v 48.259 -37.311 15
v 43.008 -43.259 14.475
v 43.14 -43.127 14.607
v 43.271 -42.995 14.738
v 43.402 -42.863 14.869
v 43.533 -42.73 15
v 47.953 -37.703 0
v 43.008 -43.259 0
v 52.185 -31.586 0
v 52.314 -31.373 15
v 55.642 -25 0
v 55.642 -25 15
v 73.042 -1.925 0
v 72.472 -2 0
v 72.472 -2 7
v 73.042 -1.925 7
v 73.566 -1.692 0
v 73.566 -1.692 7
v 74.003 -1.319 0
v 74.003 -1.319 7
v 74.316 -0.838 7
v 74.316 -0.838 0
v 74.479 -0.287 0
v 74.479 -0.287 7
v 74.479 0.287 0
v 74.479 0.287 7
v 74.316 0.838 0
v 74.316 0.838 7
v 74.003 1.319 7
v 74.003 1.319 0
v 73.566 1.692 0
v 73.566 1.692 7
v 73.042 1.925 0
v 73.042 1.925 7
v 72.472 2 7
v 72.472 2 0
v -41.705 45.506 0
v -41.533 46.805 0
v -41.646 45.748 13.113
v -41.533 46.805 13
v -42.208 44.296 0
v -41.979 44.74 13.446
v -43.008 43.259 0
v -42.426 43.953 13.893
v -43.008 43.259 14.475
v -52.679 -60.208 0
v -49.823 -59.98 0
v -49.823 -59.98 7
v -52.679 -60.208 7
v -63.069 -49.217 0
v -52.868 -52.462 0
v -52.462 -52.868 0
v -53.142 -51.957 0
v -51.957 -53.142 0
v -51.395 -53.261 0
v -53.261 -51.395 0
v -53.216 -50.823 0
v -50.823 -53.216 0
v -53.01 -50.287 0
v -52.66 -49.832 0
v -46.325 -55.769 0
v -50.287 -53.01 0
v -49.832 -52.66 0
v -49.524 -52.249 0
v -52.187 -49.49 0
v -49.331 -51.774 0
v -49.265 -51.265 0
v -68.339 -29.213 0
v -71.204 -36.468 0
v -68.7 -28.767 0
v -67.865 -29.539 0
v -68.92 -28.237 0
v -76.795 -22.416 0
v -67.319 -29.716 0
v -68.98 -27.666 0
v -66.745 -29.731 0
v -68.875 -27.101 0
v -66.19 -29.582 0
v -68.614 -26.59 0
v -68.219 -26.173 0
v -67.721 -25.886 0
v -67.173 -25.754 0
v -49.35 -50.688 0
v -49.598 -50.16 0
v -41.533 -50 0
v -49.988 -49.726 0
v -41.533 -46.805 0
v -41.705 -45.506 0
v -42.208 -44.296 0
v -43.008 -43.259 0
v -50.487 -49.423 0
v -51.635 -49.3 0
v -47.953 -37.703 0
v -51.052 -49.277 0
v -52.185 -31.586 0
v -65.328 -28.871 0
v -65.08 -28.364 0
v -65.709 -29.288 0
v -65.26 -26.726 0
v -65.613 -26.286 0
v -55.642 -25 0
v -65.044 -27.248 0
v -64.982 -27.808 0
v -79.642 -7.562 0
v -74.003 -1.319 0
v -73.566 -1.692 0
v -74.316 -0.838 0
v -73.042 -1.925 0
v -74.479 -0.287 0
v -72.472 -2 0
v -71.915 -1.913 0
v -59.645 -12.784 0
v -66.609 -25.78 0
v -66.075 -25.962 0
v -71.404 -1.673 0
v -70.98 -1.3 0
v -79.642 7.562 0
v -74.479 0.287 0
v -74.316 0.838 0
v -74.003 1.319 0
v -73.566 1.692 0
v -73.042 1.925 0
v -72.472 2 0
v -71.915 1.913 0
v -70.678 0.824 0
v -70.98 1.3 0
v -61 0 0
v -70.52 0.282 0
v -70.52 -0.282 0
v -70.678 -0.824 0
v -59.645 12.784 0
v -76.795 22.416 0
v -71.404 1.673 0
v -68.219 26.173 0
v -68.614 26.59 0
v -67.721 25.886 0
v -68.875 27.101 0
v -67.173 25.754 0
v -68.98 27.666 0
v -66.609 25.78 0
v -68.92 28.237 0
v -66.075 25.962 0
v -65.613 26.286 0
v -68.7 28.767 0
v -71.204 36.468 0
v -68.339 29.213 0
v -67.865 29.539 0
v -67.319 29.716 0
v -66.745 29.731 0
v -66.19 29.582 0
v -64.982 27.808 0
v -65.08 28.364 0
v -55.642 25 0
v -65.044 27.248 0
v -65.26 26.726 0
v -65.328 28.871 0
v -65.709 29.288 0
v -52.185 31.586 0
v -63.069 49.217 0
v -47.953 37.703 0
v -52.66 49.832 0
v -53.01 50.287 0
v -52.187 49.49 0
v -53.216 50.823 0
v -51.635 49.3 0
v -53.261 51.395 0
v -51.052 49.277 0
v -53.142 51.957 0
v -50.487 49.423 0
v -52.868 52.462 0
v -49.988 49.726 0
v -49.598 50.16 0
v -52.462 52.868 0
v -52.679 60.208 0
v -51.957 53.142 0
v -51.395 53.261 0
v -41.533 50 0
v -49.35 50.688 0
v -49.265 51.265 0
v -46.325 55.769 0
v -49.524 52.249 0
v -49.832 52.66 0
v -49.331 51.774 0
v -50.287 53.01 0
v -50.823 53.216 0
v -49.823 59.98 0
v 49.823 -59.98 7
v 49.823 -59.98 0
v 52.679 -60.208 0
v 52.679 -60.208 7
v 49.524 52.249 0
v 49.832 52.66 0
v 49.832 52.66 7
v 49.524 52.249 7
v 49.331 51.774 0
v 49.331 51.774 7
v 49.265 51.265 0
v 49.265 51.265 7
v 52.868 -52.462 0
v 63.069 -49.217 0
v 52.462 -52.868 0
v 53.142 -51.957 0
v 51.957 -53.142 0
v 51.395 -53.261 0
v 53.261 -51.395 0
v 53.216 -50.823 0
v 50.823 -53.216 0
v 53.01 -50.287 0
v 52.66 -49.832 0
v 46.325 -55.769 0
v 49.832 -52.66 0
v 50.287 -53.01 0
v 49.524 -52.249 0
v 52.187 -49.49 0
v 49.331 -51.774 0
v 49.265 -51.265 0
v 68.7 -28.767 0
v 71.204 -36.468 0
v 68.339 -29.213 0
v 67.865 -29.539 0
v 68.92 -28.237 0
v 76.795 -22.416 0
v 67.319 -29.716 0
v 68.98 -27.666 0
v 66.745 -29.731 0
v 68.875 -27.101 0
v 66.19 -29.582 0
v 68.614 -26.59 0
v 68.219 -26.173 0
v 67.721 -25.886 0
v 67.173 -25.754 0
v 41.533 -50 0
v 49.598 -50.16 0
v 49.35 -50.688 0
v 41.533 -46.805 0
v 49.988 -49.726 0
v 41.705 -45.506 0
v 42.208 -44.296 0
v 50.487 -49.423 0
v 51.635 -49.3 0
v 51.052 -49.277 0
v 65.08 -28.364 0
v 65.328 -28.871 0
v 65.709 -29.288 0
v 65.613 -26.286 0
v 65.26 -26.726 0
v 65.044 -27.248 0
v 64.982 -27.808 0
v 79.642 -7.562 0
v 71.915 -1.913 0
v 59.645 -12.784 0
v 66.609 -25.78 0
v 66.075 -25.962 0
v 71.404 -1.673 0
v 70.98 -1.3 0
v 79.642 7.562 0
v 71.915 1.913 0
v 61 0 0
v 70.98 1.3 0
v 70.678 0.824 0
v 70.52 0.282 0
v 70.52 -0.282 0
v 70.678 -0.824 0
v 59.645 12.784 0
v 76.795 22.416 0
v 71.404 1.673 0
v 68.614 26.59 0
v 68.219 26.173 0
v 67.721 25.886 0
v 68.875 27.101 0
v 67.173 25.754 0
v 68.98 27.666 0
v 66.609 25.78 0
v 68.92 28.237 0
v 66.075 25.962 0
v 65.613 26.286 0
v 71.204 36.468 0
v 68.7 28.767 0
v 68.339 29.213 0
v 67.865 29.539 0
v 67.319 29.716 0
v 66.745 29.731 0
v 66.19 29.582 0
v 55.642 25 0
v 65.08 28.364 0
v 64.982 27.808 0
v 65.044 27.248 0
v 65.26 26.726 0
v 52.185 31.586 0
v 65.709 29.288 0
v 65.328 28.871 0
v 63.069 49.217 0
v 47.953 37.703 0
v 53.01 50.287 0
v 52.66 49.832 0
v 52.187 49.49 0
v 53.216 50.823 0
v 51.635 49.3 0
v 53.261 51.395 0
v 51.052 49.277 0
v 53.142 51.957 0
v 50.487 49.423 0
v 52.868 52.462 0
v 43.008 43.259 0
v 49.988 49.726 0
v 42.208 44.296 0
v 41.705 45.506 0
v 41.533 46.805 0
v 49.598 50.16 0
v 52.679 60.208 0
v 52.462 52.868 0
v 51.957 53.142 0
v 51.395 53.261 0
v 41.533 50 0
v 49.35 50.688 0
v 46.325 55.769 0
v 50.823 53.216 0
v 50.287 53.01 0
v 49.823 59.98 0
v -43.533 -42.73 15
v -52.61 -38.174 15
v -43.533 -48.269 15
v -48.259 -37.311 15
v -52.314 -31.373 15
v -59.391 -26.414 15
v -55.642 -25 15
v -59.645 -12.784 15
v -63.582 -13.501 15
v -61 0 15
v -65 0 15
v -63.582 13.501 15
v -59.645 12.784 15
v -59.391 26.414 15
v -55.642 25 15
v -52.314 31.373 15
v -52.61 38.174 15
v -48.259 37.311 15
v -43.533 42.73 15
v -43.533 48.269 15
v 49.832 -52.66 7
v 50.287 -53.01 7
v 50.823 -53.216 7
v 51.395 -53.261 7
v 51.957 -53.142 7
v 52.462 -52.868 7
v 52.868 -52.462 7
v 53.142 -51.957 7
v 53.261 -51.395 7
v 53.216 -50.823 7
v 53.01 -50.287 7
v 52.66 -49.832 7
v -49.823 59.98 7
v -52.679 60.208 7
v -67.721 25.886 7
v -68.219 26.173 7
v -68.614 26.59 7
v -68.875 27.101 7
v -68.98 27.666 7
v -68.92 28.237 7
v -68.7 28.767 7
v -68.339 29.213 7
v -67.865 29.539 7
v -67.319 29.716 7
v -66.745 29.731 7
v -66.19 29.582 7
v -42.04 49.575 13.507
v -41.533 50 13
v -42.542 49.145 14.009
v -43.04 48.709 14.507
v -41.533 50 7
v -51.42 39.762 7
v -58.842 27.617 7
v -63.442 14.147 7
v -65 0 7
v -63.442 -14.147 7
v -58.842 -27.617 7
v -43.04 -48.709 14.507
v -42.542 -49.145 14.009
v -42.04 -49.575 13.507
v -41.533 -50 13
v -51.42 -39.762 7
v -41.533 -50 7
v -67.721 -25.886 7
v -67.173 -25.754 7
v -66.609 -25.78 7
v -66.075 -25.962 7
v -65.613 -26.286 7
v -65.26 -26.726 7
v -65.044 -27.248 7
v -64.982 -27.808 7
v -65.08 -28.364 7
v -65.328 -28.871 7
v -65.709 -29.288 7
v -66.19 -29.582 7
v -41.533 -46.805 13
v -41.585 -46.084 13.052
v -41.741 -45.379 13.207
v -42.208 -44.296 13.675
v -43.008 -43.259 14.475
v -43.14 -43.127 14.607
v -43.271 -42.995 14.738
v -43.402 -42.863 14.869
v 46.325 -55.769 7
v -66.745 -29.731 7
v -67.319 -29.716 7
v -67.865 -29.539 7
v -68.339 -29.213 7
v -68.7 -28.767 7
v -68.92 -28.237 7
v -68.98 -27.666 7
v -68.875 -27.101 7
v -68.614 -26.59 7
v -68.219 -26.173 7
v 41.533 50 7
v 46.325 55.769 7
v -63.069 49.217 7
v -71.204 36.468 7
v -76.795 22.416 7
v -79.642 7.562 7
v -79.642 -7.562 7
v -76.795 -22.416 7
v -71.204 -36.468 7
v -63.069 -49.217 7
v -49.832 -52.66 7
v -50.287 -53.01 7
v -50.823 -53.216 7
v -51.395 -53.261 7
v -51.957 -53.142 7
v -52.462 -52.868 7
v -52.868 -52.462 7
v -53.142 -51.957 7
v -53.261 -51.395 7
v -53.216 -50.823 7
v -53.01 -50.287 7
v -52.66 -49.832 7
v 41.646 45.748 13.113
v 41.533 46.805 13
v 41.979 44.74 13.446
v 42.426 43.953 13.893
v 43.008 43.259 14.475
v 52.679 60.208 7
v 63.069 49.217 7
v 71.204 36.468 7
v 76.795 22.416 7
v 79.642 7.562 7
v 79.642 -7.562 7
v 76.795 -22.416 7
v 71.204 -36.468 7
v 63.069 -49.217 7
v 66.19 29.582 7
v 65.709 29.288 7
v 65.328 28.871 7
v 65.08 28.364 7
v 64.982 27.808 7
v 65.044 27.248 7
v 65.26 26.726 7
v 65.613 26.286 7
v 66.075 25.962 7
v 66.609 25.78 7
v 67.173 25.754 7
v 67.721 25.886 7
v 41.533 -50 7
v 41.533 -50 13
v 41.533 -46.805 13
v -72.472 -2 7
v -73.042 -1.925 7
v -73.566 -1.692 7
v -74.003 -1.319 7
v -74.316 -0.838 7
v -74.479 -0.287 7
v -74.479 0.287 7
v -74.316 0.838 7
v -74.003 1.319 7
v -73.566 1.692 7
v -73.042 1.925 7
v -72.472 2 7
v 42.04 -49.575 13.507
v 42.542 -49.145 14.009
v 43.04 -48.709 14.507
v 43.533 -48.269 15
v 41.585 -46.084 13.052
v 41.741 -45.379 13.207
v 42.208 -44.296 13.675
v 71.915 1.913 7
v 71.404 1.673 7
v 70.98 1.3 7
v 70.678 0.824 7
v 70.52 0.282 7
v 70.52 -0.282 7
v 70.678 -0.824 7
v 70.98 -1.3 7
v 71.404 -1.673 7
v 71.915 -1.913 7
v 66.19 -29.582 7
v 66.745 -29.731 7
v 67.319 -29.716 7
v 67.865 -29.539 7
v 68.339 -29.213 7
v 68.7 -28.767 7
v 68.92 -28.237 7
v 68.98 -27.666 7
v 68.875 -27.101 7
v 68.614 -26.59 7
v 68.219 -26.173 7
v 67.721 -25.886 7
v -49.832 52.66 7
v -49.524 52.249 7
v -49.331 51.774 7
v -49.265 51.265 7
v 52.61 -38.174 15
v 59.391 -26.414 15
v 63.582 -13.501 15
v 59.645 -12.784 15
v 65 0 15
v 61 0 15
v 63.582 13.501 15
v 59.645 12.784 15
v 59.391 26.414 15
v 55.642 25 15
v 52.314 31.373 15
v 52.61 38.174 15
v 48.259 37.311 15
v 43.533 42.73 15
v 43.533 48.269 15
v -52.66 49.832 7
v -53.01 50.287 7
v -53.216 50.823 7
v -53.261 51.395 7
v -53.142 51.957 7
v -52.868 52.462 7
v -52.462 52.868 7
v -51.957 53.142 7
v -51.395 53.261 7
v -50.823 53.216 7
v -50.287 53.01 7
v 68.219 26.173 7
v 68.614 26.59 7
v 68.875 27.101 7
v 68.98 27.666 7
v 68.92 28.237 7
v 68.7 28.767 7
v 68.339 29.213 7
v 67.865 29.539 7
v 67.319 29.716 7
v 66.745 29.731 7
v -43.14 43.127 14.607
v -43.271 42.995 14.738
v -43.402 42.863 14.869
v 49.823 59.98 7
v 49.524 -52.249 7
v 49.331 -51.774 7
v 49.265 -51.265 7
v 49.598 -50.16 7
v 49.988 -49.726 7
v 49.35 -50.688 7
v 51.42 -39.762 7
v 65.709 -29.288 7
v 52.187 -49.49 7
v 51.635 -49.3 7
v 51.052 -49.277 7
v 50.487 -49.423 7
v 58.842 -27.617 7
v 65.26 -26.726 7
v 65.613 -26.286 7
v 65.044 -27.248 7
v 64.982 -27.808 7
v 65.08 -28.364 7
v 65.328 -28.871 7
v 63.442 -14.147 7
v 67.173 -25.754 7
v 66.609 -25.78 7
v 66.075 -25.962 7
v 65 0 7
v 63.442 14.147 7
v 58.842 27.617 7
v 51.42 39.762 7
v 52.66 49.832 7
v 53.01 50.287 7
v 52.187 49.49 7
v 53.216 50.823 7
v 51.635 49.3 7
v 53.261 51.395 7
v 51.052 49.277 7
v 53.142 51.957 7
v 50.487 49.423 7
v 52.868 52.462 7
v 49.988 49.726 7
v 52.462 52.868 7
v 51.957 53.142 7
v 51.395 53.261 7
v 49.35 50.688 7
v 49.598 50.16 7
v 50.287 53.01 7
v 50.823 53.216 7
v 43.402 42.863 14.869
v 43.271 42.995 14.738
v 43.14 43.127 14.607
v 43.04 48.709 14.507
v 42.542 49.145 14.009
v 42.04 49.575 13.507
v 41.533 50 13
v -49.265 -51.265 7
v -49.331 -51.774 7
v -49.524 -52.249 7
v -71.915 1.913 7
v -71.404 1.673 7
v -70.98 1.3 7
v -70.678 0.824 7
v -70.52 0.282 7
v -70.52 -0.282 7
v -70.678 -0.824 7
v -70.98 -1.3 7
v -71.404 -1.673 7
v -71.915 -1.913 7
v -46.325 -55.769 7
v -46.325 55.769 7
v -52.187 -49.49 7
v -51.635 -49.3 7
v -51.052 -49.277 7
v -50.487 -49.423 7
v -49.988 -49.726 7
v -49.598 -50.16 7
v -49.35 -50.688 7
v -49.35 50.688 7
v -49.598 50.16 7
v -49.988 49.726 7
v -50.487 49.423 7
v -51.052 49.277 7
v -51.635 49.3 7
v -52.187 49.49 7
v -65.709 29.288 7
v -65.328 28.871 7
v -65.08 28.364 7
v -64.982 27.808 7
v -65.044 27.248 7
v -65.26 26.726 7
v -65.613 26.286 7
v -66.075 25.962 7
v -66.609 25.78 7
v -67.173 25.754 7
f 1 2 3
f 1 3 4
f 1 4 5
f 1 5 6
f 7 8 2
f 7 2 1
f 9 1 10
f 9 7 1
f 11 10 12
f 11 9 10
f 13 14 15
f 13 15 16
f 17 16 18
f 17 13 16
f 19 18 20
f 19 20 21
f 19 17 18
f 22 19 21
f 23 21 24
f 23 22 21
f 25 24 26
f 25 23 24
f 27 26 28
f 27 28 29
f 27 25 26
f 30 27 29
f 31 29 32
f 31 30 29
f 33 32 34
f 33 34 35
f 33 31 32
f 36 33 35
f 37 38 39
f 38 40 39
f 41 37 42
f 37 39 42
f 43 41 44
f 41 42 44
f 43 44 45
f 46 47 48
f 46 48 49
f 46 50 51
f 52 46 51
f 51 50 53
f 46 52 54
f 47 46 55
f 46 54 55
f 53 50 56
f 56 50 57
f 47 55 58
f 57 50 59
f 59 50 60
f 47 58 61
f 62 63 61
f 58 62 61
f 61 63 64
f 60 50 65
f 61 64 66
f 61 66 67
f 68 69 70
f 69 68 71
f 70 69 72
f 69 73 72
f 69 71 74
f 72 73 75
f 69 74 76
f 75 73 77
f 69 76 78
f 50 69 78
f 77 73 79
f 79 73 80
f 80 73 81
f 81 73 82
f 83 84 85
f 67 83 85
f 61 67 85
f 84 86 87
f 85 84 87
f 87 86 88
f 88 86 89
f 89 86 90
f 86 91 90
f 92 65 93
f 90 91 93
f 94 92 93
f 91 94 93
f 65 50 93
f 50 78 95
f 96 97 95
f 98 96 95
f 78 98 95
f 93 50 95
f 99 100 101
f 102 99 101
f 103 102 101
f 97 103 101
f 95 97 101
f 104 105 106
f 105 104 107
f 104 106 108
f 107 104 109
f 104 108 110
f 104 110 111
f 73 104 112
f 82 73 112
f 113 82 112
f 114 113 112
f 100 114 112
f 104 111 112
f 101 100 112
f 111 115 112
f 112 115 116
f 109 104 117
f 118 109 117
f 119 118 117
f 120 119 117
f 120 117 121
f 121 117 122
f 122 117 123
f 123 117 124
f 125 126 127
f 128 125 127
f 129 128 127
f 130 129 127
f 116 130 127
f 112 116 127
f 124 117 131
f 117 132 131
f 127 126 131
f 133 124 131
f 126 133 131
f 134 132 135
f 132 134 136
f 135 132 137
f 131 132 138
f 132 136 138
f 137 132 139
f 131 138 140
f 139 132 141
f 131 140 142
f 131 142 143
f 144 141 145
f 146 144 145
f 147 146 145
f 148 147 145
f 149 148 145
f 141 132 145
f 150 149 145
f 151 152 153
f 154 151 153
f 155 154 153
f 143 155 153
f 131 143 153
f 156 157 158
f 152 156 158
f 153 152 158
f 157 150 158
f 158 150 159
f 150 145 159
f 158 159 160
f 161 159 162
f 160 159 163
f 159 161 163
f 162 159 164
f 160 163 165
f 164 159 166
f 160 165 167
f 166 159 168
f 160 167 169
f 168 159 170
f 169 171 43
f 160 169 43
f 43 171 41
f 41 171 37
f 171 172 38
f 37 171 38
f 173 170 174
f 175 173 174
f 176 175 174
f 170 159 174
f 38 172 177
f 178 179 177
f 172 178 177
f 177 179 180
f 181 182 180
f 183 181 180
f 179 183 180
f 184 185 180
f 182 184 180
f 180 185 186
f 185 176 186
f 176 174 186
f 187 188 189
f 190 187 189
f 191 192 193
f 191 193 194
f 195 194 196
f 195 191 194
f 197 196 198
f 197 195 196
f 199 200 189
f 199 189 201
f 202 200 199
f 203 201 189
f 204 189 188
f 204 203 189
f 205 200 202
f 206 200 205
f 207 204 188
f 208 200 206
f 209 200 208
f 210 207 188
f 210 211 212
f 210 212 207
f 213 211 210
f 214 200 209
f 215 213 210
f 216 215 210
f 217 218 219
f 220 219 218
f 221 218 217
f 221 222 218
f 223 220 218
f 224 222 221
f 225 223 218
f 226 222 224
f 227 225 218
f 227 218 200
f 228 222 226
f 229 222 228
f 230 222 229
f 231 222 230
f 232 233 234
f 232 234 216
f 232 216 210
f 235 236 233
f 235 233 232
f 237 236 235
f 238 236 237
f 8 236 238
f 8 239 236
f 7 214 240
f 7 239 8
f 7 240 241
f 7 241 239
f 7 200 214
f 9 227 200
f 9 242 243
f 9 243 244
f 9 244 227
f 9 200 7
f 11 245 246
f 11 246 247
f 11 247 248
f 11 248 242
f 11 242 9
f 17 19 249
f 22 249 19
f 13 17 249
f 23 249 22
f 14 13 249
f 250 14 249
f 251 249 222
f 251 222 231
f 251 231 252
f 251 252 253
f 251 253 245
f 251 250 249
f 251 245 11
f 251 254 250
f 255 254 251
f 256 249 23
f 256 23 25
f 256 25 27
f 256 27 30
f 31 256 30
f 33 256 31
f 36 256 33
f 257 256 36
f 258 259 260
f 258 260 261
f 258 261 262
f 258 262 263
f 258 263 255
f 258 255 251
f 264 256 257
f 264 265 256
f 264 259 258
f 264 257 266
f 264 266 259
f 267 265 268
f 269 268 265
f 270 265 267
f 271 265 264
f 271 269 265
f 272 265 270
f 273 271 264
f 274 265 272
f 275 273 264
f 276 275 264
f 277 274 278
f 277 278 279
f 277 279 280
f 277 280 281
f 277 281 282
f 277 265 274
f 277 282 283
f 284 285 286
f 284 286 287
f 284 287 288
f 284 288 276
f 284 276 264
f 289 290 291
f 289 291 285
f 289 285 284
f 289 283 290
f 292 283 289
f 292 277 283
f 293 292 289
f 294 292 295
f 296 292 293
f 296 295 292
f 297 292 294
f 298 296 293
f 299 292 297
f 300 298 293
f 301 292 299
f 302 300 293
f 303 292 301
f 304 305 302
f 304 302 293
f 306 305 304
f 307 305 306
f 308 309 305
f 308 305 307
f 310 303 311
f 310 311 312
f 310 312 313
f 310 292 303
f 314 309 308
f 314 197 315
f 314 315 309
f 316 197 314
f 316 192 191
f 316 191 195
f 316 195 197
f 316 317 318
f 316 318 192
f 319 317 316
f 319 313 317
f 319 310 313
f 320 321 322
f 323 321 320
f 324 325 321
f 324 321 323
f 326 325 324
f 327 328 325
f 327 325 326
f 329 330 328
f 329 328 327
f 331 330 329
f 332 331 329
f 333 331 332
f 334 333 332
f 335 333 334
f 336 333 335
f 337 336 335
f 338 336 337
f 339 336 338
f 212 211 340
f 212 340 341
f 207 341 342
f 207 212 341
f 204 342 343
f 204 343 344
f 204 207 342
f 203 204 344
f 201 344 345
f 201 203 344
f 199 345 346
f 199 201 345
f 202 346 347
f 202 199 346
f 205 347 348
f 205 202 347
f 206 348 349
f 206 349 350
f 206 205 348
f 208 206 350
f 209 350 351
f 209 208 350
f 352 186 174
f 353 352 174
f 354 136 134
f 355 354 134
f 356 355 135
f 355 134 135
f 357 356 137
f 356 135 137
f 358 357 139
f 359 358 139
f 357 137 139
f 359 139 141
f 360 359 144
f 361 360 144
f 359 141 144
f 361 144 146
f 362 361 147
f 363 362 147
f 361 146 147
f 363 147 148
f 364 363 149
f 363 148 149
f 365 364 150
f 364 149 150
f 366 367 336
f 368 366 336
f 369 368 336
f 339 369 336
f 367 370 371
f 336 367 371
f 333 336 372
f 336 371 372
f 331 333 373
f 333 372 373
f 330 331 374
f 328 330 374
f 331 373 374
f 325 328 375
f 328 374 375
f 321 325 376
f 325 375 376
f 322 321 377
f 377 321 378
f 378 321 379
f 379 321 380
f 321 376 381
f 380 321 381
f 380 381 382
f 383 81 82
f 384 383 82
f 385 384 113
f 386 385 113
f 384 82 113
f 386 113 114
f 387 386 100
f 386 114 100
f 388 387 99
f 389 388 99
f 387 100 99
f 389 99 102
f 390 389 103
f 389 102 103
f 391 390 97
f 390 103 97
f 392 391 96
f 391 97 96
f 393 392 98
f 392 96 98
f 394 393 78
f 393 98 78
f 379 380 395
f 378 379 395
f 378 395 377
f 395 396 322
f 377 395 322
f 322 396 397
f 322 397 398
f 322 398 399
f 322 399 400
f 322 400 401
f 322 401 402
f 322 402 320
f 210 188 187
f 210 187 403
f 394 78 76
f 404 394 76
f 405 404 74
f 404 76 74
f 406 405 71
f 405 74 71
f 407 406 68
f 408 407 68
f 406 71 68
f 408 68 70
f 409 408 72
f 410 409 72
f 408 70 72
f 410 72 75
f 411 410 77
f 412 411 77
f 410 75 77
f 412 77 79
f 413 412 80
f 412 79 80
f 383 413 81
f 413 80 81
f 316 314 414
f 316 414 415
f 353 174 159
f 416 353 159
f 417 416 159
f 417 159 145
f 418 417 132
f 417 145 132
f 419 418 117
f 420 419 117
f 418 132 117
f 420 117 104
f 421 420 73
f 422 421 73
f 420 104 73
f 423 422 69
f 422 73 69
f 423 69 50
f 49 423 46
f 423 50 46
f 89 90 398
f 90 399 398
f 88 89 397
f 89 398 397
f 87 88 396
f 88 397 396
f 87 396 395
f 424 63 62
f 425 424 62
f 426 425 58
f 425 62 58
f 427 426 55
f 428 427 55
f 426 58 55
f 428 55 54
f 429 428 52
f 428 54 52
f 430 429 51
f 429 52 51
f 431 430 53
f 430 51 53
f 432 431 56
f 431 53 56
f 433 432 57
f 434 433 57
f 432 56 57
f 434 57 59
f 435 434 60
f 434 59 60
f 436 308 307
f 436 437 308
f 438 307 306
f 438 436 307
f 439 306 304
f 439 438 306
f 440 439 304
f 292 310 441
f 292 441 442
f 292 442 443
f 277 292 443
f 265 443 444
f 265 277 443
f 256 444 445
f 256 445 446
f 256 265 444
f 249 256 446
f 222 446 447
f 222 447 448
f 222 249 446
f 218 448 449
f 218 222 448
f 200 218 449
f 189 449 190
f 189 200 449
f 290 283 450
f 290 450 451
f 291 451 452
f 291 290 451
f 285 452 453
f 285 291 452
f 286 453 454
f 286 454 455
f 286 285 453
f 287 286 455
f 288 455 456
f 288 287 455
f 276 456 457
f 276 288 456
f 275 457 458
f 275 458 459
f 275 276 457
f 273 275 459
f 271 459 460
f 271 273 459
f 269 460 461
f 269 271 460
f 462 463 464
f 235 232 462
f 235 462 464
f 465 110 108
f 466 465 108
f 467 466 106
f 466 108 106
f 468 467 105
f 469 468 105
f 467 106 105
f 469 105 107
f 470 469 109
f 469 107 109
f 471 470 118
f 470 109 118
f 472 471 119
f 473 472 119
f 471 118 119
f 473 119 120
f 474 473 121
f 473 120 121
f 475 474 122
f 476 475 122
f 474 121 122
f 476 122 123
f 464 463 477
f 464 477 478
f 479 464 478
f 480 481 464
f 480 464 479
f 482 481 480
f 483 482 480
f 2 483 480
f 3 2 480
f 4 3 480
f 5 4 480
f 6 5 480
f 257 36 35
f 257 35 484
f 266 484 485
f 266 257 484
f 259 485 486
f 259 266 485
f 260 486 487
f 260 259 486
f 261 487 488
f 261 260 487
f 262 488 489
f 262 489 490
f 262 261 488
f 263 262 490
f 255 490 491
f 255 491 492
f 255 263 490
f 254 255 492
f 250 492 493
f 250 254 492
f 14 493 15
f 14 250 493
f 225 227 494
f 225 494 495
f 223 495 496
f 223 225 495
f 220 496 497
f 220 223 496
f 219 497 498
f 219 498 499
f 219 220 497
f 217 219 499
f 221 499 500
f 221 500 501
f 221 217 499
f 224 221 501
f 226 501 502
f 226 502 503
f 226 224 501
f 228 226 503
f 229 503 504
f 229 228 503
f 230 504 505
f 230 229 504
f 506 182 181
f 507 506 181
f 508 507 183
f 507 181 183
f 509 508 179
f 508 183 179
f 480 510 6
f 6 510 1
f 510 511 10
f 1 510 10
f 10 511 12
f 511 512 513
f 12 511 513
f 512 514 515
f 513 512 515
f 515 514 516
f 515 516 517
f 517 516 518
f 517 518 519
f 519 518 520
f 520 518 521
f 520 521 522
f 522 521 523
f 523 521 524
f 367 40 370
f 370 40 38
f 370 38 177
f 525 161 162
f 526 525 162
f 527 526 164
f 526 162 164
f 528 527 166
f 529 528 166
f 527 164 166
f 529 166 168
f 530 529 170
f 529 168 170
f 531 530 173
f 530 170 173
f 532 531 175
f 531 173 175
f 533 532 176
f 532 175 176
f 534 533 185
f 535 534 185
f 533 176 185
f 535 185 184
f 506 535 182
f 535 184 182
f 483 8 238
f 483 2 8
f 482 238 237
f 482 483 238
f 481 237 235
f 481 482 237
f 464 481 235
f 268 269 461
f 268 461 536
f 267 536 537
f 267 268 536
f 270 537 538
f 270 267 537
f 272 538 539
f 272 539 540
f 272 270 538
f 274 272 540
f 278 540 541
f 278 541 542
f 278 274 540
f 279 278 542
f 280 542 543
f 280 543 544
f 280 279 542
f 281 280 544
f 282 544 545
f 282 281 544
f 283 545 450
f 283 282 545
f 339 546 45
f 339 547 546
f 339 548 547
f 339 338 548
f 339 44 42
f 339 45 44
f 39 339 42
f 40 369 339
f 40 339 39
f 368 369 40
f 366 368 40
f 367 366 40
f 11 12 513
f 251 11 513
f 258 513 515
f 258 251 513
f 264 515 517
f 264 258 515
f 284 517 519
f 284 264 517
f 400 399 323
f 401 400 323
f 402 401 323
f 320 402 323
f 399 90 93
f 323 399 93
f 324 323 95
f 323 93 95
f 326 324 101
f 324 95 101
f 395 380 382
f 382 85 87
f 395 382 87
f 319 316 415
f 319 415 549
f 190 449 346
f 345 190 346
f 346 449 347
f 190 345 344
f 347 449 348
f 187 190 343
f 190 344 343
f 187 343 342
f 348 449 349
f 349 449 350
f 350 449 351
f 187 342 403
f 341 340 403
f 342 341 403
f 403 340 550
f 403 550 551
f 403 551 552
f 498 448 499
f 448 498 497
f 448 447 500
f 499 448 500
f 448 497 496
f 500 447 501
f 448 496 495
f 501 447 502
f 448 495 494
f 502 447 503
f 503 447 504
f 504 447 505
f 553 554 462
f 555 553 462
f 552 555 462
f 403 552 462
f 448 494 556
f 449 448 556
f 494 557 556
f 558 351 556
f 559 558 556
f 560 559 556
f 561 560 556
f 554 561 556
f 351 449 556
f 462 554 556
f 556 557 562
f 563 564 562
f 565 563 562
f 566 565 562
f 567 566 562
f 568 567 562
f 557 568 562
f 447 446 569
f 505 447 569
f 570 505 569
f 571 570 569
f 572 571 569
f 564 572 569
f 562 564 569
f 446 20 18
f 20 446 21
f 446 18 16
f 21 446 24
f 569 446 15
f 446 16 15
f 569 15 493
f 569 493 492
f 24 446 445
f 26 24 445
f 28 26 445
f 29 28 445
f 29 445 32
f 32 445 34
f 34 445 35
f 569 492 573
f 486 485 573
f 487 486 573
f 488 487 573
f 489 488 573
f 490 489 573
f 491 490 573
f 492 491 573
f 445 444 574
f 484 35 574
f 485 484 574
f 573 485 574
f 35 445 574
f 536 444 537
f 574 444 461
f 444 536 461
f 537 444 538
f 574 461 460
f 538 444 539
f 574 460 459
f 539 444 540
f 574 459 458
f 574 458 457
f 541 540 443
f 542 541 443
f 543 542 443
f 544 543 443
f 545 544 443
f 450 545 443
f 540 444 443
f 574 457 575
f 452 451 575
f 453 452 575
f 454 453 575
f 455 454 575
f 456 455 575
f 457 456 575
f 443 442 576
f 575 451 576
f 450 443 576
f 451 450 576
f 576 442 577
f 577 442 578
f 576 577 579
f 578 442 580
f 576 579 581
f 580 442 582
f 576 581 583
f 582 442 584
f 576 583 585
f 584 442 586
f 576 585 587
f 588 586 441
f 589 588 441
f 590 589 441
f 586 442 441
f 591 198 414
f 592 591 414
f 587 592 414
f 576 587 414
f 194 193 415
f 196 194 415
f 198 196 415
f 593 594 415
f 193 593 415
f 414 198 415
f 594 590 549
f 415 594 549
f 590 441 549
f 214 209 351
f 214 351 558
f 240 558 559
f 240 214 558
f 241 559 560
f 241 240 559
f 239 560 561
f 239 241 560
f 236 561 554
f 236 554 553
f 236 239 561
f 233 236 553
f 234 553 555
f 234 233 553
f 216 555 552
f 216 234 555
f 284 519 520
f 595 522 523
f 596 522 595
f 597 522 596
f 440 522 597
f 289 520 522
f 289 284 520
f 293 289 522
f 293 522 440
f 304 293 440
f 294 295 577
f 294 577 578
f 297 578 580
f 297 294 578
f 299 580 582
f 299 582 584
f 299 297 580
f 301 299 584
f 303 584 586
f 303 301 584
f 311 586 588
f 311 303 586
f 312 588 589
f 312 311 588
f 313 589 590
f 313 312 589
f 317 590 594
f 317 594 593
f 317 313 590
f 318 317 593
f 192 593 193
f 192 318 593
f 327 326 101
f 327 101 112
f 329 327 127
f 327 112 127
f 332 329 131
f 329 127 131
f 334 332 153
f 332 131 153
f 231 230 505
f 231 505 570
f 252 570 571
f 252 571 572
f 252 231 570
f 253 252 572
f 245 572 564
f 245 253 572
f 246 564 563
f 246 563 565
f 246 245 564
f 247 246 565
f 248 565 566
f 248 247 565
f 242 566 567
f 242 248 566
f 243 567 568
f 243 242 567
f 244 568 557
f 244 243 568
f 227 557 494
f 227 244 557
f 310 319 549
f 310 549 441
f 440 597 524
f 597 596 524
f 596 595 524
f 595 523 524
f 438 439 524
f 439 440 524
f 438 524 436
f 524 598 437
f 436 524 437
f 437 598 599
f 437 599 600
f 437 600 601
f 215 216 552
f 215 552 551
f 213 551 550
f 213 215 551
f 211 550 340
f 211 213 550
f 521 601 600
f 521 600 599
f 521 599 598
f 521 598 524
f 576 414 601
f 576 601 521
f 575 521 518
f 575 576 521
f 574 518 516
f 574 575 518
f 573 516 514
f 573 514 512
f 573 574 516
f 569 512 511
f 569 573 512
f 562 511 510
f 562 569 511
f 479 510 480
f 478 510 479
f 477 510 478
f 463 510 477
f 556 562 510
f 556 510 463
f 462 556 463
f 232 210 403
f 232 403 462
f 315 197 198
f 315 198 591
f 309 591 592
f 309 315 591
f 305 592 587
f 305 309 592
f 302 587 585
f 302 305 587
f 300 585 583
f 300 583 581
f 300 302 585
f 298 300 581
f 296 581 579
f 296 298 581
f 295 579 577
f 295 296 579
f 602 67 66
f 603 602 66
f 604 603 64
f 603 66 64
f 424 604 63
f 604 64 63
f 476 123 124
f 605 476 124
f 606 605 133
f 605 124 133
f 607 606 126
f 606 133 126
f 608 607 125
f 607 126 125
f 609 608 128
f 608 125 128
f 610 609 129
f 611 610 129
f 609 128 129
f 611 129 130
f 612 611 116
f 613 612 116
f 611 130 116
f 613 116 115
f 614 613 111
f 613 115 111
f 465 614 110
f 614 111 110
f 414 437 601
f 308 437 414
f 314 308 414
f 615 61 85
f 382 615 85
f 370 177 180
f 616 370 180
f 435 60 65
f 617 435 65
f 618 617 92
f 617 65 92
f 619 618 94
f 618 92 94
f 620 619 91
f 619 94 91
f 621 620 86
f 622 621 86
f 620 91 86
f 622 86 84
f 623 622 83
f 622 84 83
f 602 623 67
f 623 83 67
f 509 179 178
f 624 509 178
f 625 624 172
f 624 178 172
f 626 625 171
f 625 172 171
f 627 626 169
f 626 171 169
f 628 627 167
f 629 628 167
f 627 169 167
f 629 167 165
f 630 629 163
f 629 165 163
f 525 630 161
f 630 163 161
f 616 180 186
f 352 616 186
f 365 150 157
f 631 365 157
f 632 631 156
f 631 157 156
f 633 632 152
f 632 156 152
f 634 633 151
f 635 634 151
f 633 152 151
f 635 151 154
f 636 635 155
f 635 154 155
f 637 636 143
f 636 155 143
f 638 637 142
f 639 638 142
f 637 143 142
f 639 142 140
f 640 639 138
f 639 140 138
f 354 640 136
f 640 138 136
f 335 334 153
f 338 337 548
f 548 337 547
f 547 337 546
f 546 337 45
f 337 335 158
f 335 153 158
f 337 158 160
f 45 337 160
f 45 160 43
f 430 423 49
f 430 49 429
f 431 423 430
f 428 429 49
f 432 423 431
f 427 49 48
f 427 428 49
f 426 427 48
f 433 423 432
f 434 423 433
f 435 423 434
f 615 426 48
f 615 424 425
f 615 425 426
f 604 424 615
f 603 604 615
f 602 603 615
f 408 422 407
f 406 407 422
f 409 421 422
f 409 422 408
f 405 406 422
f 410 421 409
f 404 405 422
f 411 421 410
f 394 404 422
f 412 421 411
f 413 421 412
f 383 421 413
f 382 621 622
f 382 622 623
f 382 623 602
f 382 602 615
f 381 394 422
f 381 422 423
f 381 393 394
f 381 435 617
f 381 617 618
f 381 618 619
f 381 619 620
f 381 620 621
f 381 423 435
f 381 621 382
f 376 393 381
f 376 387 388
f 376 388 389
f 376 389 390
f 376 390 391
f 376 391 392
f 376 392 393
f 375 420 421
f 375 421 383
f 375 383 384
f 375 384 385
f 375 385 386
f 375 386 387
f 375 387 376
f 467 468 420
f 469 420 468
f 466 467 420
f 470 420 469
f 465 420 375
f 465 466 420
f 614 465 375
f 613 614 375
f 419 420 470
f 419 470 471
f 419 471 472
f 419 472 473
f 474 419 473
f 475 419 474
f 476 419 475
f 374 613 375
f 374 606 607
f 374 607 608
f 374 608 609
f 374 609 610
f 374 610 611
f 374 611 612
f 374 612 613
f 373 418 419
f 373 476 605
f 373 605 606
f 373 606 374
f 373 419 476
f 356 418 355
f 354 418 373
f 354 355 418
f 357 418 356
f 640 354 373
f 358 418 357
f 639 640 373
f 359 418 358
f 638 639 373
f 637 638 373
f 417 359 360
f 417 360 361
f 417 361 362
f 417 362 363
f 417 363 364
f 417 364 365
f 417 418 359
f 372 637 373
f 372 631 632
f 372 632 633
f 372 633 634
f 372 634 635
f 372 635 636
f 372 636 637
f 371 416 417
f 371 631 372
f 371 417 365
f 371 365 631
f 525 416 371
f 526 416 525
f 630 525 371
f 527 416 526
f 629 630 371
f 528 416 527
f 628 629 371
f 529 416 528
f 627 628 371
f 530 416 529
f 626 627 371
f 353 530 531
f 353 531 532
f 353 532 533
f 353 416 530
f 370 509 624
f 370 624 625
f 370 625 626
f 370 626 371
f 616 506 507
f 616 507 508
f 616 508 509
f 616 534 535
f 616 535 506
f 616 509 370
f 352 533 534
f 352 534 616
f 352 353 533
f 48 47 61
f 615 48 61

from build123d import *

# Parameters (mm, degrees)
F1_DEPTH    = 15
F2_DEPTH    = 7
F3_T1_DEPTH = 15.6101161445
F3_T3_DEPTH = 15.6101161445
F3_T5_DEPTH = 17.5438904605
F4_R        = 5


# Not quite as in the source:
# - a fillet or chamfer that OpenCascade refuses, or shapes differently, is made with other operations: its cross-section is extruded or revolved along the edge and cut away or added


with BuildPart() as f1:
    # F0 (on Top) → F1 (new body)
    with BuildSketch(Plane.XY):
        with BuildLine():
            ThreePointArc((-55.641710973, -25), (-61, 0), (-55.641710973, 25))
            ThreePointArc((-55.641710973, 25), (-49.5734728737, 35.5453342541), (-41.5331193146, 44.6766158074))
            Line((-41.5331193146, 44.6766158074), (-41.5331193146, 50))
            ThreePointArc((-41.5331193146, 50), (-65, 0), (-41.5331193146, -50))
            Line((-41.5331193146, -50), (-41.5331193146, -44.6766158074))
            ThreePointArc((-41.5331193146, -44.6766158074), (-49.5734728737, -35.5453342541), (-55.641710973, -25))
        make_face()
    extrude(amount=F1_DEPTH)

    # F0 (on Top) → F2 (join)
    with BuildSketch(Plane.XY):
        with BuildLine():
            ThreePointArc((-41.5331193146, -50), (-65, 0), (-41.5331193146, 50))
            Line((-41.5331193146, 50), (-46.3254023124, 55.7692307692))
            ThreePointArc((-46.3254023124, 55.7692307692), (-48.1036598795, 54.2428604168), (-49.8316562129, 52.6598142712))
            ThreePointArc((-49.8316562129, 52.6598142712), (-49.4122479979, 52.0178468293), (-49.265241636, 51.265241636))
            ThreePointArc((-49.265241636, 51.265241636), (-50.4871495047, 49.4228050333), (-52.6598142712, 49.8316562129))
            ThreePointArc((-52.6598142712, 49.8316562129), (-60.2815468919, 40.2788418939), (-66.1904857193, 29.581575351))
            ThreePointArc((-66.1904857193, 29.581575351), (-65.3107032116, 28.8441940675), (-64.9812661071, 27.7445488465))
            ThreePointArc((-64.9812661071, 27.7445488465), (-65.8586832477, 26.0893123909), (-67.721073831, 25.8864087733))
            ThreePointArc((-67.721073831, 25.8864087733), (-71.1069328292, 14.1440483462), (-72.4724137931, 1.9998097412))
            ThreePointArc((-72.4724137931, 1.9998097412), (-71.0760666424, 1.4044264997), (-70.5, 0))
            ThreePointArc((-70.5, 0), (-71.0760666424, -1.4044264997), (-72.4724137931, -1.9998097412))
            ThreePointArc((-72.4724137931, -1.9998097412), (-71.1069328292, -14.1440483462), (-67.721073831, -25.8864087733))
            ThreePointArc((-67.721073831, -25.8864087733), (-65.8586832477, -26.0893123909), (-64.9812661071, -27.7445488465))
            ThreePointArc((-64.9812661071, -27.7445488465), (-65.3107032116, -28.8441940675), (-66.1904857193, -29.581575351))
            ThreePointArc((-66.1904857193, -29.581575351), (-60.2815468919, -40.2788418939), (-52.6598142712, -49.8316562129))
            ThreePointArc((-52.6598142712, -49.8316562129), (-50.4871495047, -49.4228050333), (-49.265241636, -51.265241636))
            ThreePointArc((-49.265241636, -51.265241636), (-49.4122479979, -52.0178468293), (-49.8316562129, -52.6598142712))
            ThreePointArc((-49.8316562129, -52.6598142712), (-48.1036598795, -54.2428604168), (-46.3254023124, -55.7692307692))
            Line((-46.3254023124, -55.7692307692), (-41.5331193146, -50))
        make_face()
        with BuildLine():
            ThreePointArc((-49.8316562129, 52.6598142712), (-48.1036598795, 54.2428604168), (-46.3254023124, 55.7692307692))
            Line((-46.3254023124, 55.7692307692), (-51.1176853103, 61.5384615385))
            ThreePointArc((-51.1176853103, 61.5384615385), (-80, 0), (-51.1176853103, -61.5384615385))
            Line((-51.1176853103, -61.5384615385), (-46.3254023124, -55.7692307692))
            ThreePointArc((-46.3254023124, -55.7692307692), (-48.1036598795, -54.2428604168), (-49.8316562129, -52.6598142712))
            ThreePointArc((-49.8316562129, -52.6598142712), (-52.6794551984, -52.6794551984), (-52.6598142712, -49.8316562129))
            ThreePointArc((-52.6598142712, -49.8316562129), (-60.2815468919, -40.2788418939), (-66.1904857193, -29.581575351))
            ThreePointArc((-66.1904857193, -29.581575351), (-68.8290251721, -28.5099157112), (-67.721073831, -25.8864087733))
            ThreePointArc((-67.721073831, -25.8864087733), (-71.1069328292, -14.1440483462), (-72.4724137931, -1.9998097412))
            ThreePointArc((-72.4724137931, -1.9998097412), (-74.5, 0), (-72.4724137931, 1.9998097412))
            ThreePointArc((-72.4724137931, 1.9998097412), (-71.1069328292, 14.1440483462), (-67.721073831, 25.8864087733))
            ThreePointArc((-67.721073831, 25.8864087733), (-68.8290251721, 28.5099157112), (-66.1904857193, 29.581575351))
            ThreePointArc((-66.1904857193, 29.581575351), (-60.2815468919, 40.2788418939), (-52.6598142712, 49.8316562129))
            ThreePointArc((-52.6598142712, 49.8316562129), (-52.6794551984, 52.6794551984), (-49.8316562129, 52.6598142712))
        make_face()
    extrude(amount=F2_DEPTH)

    # F3: chamfer of 2 on 4 edges, made by hand

    # F3_s2 → F3_t1 (cut)
    with BuildSketch(Plane.XZ.offset(39.5332498314)):
        Polygon((-41.5331193146, 13), (-43.5331193146, 15), (-41.5331193146, 15), align=None)
    extrude(amount=F3_T1_DEPTH, mode=Mode.SUBTRACT)

    # F3_s4 → F3_t3 (cut)
    with BuildSketch(Plane.XZ.offset(-55.1433659759)):
        Polygon((-43.5331193146, 15), (-41.5331193146, 13), (-41.5331193146, 15), align=None)
    extrude(amount=F3_T3_DEPTH, mode=Mode.SUBTRACT)

    # F3_s6 → F3_t5 (cut)
    with BuildSketch(Plane.XY.offset(-5.2719452303)):
        with BuildLine():
            Line((-49.8233566102, 59.9802728911), (-52.6787878448, 60.2075187265))
            ThreePointArc((-52.6787878448, 60.2075187265), (-51.9240174848, 60.8596451538), (-51.1176853103, 61.5384615385))
            Line((-51.1176853103, 61.5384615385), (-49.8233566102, 59.9802728911))
        make_face()
        with BuildLine():
            Line((-49.8233566102, -59.9802728911), (-52.6787878448, -60.2075187265))
            ThreePointArc((-52.6787878448, -60.2075187265), (-51.9240174848, -60.8596451538), (-51.1176853103, -61.5384615385))
            Line((-51.1176853103, -61.5384615385), (-49.8233566102, -59.9802728911))
        make_face()
    extrude(amount=F3_T5_DEPTH, mode=Mode.SUBTRACT)

    # F4
    f4_edges = [f1.edges().sort_by_distance(p)[0] for p in [
        (-41.533119, 44.676616, 6.5),
        (-41.533119, -44.676616, 6.5),
    ]]
    fillet(f4_edges, radius=F4_R)


with BuildPart() as f5_1:
    # F5: instance of F1
    add(f1.part.mirror(Plane.YZ))


solid = Compound([f1.part, f5_1.part])
